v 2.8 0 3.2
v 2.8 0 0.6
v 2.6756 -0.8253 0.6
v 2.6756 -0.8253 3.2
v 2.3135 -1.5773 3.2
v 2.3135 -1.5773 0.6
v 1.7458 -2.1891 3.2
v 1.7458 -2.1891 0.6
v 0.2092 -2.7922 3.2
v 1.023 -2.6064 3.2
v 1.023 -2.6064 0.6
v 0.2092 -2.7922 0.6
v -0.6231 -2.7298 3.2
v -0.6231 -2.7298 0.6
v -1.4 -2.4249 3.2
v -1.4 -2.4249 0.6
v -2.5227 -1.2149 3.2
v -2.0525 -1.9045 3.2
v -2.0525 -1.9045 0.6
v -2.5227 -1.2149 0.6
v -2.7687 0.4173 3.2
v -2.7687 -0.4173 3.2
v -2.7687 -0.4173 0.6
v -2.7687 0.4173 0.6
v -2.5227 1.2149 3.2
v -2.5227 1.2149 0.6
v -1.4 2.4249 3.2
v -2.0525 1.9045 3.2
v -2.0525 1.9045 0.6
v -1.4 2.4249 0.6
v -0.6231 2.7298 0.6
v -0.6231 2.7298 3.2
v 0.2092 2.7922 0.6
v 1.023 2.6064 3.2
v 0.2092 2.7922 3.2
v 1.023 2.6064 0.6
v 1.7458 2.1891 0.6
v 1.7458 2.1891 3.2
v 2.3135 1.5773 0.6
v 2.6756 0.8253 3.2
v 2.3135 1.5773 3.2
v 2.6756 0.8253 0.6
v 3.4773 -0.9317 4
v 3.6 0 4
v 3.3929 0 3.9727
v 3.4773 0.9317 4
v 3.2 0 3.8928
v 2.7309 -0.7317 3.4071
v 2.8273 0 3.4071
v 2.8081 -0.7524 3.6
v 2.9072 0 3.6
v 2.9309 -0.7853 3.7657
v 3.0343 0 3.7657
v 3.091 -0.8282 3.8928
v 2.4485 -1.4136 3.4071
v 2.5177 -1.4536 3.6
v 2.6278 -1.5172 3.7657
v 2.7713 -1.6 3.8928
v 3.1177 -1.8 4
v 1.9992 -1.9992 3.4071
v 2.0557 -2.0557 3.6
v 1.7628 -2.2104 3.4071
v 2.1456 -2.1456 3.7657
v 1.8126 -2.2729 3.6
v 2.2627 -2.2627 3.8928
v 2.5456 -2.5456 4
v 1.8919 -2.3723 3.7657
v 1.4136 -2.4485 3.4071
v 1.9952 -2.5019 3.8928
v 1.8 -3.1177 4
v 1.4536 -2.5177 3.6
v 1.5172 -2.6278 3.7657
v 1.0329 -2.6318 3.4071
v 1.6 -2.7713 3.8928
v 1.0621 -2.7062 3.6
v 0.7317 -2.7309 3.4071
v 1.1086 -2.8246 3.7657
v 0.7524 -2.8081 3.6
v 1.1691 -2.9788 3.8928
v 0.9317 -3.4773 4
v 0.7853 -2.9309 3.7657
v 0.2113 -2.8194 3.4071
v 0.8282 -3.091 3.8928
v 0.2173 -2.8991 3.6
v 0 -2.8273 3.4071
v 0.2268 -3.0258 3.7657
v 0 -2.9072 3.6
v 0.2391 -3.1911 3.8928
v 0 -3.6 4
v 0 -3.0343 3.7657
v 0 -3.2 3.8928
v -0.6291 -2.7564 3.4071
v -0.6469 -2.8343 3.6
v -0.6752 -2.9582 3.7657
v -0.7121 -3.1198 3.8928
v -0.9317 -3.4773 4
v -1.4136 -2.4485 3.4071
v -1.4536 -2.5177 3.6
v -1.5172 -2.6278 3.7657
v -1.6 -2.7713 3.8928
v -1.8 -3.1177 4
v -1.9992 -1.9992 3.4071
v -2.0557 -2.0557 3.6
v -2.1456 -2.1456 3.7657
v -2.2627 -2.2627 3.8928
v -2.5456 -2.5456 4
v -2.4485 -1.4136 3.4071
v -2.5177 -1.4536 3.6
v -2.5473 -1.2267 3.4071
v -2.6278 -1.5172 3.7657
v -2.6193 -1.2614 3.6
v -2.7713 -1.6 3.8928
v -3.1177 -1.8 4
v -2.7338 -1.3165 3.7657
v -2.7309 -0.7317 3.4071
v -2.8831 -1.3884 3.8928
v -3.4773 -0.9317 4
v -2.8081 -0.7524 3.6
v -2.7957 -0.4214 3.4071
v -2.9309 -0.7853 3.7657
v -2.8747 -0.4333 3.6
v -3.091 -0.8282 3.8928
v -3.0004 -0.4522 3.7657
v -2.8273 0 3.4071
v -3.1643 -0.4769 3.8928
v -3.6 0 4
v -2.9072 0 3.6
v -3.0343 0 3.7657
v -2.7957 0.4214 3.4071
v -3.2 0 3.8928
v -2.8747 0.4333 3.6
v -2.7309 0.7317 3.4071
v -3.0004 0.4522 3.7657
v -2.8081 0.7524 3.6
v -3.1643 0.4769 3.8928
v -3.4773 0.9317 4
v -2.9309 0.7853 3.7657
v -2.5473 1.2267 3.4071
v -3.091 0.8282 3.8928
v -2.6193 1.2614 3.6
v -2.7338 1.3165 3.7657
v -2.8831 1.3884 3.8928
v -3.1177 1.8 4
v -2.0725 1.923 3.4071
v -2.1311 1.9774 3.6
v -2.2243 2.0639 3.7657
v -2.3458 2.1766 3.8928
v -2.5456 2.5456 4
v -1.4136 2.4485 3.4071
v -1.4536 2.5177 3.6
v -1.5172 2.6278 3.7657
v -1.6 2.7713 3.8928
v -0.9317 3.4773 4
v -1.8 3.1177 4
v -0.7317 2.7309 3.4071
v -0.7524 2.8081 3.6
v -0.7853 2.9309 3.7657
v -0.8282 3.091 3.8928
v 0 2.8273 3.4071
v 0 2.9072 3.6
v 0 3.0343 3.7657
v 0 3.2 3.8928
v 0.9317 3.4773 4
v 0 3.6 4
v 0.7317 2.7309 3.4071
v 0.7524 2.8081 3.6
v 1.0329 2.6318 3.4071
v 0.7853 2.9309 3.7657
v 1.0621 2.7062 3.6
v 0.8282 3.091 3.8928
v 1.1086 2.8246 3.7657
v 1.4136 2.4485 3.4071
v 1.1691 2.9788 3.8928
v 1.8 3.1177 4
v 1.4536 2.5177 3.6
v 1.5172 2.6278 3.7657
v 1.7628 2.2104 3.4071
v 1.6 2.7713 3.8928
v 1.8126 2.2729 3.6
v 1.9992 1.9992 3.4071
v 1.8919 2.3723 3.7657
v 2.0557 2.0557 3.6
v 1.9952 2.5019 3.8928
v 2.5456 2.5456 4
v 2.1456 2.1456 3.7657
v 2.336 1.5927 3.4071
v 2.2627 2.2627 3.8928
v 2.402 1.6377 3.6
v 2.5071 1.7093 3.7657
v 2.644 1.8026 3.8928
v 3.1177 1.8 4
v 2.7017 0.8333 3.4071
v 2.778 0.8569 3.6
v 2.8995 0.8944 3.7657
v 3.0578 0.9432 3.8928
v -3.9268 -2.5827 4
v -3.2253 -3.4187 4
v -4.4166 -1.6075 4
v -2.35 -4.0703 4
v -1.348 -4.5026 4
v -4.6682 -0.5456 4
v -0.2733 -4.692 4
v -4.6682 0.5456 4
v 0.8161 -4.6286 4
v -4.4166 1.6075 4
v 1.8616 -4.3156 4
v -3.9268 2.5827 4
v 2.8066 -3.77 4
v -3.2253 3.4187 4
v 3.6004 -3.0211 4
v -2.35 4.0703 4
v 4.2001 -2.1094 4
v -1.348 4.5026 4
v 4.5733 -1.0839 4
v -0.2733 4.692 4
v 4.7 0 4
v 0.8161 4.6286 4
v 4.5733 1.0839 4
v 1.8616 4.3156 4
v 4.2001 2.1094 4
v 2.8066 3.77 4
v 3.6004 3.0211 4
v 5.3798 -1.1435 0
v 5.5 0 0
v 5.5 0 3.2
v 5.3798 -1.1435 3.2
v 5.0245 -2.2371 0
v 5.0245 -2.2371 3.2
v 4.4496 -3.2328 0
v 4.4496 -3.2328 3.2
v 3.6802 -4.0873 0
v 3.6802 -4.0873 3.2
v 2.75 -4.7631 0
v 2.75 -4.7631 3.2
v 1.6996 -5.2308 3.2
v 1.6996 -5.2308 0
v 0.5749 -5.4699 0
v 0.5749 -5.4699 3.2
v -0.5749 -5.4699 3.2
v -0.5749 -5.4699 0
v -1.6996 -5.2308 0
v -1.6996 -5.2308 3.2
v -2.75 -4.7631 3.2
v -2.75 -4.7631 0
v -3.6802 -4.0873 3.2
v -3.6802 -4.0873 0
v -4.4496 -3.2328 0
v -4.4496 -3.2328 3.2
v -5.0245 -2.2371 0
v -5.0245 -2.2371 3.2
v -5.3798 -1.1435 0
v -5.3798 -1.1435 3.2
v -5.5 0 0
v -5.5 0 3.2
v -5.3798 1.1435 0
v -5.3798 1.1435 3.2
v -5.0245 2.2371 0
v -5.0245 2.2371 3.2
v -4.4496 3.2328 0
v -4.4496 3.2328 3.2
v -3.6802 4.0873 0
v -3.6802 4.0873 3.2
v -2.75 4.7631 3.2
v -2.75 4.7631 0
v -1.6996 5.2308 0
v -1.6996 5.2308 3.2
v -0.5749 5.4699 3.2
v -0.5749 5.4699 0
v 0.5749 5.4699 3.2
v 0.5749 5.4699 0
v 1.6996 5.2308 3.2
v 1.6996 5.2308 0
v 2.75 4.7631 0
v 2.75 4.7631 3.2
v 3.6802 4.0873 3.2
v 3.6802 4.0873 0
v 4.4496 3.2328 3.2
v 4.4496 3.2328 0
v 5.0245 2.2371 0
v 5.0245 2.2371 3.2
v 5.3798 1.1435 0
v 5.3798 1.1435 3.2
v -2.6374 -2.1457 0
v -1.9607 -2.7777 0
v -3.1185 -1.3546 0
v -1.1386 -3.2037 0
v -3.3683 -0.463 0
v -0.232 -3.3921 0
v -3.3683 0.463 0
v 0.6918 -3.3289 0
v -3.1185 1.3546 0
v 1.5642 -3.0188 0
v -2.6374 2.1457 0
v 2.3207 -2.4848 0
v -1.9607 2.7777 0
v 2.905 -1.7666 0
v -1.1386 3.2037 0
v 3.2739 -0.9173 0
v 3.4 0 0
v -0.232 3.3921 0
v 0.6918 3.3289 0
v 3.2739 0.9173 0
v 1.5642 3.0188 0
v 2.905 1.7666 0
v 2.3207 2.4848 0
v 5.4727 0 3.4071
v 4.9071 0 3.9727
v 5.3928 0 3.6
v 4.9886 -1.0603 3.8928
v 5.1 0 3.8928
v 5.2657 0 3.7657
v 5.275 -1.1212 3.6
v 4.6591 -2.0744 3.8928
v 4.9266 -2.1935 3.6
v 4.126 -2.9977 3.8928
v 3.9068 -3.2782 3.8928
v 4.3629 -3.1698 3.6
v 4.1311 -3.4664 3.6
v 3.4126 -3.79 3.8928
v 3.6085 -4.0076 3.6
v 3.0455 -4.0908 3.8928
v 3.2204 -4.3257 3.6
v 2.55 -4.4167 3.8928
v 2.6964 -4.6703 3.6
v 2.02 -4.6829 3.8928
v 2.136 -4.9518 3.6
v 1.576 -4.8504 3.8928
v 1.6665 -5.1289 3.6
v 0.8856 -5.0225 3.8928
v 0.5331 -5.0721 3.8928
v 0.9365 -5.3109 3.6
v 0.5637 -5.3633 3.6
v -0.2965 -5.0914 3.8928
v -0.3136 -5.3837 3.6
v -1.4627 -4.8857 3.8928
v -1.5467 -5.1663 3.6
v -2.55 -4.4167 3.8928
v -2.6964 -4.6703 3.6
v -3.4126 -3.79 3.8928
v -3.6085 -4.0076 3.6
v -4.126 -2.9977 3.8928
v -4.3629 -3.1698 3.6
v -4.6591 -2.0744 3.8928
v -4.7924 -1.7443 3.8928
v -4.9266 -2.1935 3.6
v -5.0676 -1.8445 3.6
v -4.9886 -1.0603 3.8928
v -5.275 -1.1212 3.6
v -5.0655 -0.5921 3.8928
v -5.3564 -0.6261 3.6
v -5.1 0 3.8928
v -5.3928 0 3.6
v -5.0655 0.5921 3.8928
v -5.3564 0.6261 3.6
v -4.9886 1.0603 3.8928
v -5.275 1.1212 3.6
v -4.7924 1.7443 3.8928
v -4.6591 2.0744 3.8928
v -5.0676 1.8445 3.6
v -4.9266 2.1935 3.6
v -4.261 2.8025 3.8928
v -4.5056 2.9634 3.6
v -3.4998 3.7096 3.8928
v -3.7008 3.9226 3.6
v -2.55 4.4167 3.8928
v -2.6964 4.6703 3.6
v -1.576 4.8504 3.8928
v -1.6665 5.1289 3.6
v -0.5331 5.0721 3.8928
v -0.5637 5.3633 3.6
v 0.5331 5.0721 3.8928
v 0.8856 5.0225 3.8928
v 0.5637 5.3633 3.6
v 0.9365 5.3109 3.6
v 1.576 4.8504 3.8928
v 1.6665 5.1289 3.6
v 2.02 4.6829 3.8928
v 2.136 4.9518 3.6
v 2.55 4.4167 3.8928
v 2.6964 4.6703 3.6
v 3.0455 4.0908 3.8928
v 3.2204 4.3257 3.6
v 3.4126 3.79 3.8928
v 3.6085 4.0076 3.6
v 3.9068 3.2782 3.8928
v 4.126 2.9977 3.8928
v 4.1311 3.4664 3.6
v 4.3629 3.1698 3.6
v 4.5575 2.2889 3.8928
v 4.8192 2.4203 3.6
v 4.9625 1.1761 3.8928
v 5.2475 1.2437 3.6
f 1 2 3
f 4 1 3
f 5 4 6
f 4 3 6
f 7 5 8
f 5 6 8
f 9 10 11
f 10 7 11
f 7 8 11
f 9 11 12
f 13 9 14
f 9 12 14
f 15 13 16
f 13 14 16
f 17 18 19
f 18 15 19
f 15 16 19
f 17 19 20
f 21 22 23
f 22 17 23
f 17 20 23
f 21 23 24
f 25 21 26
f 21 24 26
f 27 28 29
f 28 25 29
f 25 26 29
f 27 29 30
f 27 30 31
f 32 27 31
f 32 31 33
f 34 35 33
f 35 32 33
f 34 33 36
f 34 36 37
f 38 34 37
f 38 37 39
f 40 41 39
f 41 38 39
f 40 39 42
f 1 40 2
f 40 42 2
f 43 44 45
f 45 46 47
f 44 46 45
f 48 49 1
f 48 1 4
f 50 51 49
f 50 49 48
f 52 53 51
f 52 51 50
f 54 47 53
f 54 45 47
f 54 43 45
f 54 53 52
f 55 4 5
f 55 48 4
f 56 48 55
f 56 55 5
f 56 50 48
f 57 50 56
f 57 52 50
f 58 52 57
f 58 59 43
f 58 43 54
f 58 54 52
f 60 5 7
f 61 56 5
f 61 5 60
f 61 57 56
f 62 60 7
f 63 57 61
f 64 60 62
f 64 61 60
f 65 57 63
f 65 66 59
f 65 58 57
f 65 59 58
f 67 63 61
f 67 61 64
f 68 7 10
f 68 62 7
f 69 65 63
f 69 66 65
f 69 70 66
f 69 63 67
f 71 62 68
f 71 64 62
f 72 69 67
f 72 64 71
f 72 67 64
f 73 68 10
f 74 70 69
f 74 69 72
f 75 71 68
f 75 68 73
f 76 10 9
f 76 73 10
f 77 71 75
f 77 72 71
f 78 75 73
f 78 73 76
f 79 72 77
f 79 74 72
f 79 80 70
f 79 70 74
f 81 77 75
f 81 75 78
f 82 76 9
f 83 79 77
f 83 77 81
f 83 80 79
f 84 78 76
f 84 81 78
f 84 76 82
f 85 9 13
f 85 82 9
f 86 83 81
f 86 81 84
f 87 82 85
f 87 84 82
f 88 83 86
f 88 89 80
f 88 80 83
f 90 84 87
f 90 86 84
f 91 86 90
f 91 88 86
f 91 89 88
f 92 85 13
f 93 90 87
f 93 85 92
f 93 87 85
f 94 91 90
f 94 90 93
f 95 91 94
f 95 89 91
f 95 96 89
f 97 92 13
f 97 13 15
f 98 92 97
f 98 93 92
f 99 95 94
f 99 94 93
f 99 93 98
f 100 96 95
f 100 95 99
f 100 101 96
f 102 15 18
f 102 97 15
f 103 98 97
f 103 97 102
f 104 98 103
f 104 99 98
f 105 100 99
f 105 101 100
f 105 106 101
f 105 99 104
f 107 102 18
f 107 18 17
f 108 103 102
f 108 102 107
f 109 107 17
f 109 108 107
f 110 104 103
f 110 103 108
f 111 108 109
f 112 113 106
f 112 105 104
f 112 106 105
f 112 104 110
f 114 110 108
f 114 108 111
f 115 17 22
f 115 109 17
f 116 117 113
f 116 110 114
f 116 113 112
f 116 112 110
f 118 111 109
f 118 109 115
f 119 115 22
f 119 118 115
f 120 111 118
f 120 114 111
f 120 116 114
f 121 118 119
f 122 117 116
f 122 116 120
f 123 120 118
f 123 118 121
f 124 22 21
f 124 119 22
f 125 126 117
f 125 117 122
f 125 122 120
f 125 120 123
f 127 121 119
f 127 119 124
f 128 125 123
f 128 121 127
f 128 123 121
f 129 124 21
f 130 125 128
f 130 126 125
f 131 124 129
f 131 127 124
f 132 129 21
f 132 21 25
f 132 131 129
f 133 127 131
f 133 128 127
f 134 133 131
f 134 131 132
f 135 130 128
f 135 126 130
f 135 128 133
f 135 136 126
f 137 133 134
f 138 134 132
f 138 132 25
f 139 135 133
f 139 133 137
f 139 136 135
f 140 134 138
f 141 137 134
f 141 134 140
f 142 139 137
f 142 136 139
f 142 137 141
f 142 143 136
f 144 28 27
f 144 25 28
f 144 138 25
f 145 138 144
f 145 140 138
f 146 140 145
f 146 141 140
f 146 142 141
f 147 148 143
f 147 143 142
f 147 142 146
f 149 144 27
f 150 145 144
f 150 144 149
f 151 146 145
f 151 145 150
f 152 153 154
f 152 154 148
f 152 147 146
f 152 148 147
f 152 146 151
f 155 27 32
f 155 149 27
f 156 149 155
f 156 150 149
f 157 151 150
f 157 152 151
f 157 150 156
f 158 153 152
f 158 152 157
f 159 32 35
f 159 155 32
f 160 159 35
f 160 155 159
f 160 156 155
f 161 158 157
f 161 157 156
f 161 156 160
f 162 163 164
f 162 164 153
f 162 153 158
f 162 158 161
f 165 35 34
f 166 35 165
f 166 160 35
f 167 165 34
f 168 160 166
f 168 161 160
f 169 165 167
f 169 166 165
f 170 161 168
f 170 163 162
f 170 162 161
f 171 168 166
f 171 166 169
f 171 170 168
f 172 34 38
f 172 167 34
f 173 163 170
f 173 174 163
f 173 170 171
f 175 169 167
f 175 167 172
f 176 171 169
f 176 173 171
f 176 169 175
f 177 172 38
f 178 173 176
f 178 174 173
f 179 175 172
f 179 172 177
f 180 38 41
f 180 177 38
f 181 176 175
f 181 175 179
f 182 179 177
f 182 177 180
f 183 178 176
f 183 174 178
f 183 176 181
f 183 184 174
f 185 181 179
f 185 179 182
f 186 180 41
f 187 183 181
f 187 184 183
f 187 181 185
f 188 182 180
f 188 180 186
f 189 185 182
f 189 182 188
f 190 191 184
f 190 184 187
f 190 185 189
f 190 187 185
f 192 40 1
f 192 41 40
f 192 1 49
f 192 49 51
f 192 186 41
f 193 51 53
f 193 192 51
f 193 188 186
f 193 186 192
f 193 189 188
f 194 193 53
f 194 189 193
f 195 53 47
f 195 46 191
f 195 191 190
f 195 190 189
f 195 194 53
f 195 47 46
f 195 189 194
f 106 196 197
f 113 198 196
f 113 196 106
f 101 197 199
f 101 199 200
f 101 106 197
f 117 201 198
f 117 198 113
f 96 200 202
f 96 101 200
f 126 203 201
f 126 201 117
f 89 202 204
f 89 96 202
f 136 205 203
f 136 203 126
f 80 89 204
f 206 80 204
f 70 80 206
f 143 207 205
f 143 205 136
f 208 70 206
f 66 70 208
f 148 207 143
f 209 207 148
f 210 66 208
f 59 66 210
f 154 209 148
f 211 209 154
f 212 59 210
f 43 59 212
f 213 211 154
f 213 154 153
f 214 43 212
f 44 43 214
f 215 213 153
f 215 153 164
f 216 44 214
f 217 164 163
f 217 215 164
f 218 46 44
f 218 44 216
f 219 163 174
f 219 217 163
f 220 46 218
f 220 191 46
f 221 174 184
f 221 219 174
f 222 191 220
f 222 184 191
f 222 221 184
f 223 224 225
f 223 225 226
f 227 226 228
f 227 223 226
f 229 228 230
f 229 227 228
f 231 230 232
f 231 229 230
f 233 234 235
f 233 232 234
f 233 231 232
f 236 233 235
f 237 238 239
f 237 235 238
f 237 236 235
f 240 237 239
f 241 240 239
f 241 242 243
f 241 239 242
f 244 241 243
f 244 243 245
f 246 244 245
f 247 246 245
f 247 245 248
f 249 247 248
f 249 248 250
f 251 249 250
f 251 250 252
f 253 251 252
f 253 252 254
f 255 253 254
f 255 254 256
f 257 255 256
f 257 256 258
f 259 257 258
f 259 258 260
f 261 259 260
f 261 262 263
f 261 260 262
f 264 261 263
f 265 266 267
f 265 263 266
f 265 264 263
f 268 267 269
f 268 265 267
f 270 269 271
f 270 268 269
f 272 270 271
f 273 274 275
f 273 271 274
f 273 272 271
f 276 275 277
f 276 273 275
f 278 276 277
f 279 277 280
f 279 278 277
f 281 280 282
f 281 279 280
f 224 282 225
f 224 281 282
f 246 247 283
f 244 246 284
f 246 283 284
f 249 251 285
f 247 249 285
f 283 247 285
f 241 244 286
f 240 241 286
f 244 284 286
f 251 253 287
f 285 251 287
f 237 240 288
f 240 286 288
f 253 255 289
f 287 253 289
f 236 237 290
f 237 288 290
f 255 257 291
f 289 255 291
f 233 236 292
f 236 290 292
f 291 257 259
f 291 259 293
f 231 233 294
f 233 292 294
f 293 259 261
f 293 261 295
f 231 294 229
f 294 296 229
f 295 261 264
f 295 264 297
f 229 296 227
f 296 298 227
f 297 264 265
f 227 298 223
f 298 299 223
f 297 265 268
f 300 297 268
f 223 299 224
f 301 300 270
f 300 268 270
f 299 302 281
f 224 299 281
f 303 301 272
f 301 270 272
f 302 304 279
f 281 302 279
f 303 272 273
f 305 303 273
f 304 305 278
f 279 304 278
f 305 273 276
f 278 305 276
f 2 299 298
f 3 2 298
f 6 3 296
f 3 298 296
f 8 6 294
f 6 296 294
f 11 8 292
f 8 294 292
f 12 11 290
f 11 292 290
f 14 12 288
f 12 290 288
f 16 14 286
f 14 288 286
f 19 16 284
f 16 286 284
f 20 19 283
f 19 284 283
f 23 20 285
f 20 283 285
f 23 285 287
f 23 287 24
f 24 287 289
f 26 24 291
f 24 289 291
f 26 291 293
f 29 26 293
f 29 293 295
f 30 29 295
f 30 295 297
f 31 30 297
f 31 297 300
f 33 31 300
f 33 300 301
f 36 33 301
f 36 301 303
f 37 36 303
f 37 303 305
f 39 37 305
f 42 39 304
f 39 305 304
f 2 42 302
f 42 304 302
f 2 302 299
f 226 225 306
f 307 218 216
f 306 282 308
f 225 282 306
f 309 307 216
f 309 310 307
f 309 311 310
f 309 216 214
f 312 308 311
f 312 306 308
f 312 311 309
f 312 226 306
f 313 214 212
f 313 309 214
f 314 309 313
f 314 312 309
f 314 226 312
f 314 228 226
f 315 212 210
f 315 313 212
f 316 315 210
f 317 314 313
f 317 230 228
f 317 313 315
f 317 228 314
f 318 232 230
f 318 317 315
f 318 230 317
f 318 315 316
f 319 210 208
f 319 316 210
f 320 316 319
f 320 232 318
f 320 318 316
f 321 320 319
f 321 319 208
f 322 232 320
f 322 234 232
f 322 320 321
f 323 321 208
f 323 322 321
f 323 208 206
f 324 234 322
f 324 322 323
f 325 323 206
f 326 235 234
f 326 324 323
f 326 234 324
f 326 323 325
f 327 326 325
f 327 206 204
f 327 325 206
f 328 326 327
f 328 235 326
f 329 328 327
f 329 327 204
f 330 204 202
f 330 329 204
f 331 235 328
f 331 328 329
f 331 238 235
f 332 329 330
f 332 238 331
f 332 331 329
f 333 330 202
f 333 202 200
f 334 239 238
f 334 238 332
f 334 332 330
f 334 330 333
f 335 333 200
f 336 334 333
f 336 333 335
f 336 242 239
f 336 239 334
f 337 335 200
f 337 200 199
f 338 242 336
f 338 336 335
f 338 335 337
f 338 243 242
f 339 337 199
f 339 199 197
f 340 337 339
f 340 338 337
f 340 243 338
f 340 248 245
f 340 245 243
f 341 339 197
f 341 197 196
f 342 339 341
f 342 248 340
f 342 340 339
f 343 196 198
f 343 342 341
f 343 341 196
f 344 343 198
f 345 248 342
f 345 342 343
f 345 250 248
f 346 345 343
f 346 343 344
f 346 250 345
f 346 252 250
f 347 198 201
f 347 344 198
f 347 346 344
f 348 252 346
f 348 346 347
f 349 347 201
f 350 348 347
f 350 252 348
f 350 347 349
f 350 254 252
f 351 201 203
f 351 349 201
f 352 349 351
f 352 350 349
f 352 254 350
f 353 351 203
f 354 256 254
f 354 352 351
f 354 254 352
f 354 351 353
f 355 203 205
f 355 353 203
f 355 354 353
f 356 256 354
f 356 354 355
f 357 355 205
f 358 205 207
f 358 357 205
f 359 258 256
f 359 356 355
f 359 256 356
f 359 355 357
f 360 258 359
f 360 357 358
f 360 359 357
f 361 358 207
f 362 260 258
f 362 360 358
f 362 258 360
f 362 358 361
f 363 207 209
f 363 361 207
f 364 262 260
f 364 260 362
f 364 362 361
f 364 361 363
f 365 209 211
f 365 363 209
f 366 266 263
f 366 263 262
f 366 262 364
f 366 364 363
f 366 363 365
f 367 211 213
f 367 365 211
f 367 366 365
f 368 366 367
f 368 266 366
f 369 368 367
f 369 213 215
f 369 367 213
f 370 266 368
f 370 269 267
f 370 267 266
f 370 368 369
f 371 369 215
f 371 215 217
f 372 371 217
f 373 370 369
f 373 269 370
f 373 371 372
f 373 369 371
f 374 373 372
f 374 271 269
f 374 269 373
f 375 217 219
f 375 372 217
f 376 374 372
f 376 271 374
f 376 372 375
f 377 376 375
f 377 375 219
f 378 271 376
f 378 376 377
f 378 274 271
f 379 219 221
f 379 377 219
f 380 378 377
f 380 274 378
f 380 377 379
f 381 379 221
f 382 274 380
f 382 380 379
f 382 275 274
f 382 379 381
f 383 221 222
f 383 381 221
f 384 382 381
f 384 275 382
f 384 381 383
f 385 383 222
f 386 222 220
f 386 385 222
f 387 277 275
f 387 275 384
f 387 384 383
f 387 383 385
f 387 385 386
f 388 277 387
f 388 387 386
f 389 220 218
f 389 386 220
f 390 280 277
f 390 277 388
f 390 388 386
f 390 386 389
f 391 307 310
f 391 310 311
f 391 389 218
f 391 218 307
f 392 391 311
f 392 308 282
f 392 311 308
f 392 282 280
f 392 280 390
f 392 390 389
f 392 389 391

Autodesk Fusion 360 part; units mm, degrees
sketch "Sketch1" plane through (0, 0, 0) normal (0, 0, 1) x (1, 0, 0)
  circle A0 centre (0, 0) radius 2.8
  circle A1 centre (0, 0) radius 5.5
  dimension "d1" = 5.6
  dimension "d2" = 2.7
extrude "Extrude1" add sketch "Sketch1" along normal blind 4
chamfer "Chamfer1" distance 0.6 angle 45 1 edges at (-2.6105, 1.0125, 0)
fillet "Fillet1" radius 0.8 1 faces at (4.5691, -0.4124, 4)
